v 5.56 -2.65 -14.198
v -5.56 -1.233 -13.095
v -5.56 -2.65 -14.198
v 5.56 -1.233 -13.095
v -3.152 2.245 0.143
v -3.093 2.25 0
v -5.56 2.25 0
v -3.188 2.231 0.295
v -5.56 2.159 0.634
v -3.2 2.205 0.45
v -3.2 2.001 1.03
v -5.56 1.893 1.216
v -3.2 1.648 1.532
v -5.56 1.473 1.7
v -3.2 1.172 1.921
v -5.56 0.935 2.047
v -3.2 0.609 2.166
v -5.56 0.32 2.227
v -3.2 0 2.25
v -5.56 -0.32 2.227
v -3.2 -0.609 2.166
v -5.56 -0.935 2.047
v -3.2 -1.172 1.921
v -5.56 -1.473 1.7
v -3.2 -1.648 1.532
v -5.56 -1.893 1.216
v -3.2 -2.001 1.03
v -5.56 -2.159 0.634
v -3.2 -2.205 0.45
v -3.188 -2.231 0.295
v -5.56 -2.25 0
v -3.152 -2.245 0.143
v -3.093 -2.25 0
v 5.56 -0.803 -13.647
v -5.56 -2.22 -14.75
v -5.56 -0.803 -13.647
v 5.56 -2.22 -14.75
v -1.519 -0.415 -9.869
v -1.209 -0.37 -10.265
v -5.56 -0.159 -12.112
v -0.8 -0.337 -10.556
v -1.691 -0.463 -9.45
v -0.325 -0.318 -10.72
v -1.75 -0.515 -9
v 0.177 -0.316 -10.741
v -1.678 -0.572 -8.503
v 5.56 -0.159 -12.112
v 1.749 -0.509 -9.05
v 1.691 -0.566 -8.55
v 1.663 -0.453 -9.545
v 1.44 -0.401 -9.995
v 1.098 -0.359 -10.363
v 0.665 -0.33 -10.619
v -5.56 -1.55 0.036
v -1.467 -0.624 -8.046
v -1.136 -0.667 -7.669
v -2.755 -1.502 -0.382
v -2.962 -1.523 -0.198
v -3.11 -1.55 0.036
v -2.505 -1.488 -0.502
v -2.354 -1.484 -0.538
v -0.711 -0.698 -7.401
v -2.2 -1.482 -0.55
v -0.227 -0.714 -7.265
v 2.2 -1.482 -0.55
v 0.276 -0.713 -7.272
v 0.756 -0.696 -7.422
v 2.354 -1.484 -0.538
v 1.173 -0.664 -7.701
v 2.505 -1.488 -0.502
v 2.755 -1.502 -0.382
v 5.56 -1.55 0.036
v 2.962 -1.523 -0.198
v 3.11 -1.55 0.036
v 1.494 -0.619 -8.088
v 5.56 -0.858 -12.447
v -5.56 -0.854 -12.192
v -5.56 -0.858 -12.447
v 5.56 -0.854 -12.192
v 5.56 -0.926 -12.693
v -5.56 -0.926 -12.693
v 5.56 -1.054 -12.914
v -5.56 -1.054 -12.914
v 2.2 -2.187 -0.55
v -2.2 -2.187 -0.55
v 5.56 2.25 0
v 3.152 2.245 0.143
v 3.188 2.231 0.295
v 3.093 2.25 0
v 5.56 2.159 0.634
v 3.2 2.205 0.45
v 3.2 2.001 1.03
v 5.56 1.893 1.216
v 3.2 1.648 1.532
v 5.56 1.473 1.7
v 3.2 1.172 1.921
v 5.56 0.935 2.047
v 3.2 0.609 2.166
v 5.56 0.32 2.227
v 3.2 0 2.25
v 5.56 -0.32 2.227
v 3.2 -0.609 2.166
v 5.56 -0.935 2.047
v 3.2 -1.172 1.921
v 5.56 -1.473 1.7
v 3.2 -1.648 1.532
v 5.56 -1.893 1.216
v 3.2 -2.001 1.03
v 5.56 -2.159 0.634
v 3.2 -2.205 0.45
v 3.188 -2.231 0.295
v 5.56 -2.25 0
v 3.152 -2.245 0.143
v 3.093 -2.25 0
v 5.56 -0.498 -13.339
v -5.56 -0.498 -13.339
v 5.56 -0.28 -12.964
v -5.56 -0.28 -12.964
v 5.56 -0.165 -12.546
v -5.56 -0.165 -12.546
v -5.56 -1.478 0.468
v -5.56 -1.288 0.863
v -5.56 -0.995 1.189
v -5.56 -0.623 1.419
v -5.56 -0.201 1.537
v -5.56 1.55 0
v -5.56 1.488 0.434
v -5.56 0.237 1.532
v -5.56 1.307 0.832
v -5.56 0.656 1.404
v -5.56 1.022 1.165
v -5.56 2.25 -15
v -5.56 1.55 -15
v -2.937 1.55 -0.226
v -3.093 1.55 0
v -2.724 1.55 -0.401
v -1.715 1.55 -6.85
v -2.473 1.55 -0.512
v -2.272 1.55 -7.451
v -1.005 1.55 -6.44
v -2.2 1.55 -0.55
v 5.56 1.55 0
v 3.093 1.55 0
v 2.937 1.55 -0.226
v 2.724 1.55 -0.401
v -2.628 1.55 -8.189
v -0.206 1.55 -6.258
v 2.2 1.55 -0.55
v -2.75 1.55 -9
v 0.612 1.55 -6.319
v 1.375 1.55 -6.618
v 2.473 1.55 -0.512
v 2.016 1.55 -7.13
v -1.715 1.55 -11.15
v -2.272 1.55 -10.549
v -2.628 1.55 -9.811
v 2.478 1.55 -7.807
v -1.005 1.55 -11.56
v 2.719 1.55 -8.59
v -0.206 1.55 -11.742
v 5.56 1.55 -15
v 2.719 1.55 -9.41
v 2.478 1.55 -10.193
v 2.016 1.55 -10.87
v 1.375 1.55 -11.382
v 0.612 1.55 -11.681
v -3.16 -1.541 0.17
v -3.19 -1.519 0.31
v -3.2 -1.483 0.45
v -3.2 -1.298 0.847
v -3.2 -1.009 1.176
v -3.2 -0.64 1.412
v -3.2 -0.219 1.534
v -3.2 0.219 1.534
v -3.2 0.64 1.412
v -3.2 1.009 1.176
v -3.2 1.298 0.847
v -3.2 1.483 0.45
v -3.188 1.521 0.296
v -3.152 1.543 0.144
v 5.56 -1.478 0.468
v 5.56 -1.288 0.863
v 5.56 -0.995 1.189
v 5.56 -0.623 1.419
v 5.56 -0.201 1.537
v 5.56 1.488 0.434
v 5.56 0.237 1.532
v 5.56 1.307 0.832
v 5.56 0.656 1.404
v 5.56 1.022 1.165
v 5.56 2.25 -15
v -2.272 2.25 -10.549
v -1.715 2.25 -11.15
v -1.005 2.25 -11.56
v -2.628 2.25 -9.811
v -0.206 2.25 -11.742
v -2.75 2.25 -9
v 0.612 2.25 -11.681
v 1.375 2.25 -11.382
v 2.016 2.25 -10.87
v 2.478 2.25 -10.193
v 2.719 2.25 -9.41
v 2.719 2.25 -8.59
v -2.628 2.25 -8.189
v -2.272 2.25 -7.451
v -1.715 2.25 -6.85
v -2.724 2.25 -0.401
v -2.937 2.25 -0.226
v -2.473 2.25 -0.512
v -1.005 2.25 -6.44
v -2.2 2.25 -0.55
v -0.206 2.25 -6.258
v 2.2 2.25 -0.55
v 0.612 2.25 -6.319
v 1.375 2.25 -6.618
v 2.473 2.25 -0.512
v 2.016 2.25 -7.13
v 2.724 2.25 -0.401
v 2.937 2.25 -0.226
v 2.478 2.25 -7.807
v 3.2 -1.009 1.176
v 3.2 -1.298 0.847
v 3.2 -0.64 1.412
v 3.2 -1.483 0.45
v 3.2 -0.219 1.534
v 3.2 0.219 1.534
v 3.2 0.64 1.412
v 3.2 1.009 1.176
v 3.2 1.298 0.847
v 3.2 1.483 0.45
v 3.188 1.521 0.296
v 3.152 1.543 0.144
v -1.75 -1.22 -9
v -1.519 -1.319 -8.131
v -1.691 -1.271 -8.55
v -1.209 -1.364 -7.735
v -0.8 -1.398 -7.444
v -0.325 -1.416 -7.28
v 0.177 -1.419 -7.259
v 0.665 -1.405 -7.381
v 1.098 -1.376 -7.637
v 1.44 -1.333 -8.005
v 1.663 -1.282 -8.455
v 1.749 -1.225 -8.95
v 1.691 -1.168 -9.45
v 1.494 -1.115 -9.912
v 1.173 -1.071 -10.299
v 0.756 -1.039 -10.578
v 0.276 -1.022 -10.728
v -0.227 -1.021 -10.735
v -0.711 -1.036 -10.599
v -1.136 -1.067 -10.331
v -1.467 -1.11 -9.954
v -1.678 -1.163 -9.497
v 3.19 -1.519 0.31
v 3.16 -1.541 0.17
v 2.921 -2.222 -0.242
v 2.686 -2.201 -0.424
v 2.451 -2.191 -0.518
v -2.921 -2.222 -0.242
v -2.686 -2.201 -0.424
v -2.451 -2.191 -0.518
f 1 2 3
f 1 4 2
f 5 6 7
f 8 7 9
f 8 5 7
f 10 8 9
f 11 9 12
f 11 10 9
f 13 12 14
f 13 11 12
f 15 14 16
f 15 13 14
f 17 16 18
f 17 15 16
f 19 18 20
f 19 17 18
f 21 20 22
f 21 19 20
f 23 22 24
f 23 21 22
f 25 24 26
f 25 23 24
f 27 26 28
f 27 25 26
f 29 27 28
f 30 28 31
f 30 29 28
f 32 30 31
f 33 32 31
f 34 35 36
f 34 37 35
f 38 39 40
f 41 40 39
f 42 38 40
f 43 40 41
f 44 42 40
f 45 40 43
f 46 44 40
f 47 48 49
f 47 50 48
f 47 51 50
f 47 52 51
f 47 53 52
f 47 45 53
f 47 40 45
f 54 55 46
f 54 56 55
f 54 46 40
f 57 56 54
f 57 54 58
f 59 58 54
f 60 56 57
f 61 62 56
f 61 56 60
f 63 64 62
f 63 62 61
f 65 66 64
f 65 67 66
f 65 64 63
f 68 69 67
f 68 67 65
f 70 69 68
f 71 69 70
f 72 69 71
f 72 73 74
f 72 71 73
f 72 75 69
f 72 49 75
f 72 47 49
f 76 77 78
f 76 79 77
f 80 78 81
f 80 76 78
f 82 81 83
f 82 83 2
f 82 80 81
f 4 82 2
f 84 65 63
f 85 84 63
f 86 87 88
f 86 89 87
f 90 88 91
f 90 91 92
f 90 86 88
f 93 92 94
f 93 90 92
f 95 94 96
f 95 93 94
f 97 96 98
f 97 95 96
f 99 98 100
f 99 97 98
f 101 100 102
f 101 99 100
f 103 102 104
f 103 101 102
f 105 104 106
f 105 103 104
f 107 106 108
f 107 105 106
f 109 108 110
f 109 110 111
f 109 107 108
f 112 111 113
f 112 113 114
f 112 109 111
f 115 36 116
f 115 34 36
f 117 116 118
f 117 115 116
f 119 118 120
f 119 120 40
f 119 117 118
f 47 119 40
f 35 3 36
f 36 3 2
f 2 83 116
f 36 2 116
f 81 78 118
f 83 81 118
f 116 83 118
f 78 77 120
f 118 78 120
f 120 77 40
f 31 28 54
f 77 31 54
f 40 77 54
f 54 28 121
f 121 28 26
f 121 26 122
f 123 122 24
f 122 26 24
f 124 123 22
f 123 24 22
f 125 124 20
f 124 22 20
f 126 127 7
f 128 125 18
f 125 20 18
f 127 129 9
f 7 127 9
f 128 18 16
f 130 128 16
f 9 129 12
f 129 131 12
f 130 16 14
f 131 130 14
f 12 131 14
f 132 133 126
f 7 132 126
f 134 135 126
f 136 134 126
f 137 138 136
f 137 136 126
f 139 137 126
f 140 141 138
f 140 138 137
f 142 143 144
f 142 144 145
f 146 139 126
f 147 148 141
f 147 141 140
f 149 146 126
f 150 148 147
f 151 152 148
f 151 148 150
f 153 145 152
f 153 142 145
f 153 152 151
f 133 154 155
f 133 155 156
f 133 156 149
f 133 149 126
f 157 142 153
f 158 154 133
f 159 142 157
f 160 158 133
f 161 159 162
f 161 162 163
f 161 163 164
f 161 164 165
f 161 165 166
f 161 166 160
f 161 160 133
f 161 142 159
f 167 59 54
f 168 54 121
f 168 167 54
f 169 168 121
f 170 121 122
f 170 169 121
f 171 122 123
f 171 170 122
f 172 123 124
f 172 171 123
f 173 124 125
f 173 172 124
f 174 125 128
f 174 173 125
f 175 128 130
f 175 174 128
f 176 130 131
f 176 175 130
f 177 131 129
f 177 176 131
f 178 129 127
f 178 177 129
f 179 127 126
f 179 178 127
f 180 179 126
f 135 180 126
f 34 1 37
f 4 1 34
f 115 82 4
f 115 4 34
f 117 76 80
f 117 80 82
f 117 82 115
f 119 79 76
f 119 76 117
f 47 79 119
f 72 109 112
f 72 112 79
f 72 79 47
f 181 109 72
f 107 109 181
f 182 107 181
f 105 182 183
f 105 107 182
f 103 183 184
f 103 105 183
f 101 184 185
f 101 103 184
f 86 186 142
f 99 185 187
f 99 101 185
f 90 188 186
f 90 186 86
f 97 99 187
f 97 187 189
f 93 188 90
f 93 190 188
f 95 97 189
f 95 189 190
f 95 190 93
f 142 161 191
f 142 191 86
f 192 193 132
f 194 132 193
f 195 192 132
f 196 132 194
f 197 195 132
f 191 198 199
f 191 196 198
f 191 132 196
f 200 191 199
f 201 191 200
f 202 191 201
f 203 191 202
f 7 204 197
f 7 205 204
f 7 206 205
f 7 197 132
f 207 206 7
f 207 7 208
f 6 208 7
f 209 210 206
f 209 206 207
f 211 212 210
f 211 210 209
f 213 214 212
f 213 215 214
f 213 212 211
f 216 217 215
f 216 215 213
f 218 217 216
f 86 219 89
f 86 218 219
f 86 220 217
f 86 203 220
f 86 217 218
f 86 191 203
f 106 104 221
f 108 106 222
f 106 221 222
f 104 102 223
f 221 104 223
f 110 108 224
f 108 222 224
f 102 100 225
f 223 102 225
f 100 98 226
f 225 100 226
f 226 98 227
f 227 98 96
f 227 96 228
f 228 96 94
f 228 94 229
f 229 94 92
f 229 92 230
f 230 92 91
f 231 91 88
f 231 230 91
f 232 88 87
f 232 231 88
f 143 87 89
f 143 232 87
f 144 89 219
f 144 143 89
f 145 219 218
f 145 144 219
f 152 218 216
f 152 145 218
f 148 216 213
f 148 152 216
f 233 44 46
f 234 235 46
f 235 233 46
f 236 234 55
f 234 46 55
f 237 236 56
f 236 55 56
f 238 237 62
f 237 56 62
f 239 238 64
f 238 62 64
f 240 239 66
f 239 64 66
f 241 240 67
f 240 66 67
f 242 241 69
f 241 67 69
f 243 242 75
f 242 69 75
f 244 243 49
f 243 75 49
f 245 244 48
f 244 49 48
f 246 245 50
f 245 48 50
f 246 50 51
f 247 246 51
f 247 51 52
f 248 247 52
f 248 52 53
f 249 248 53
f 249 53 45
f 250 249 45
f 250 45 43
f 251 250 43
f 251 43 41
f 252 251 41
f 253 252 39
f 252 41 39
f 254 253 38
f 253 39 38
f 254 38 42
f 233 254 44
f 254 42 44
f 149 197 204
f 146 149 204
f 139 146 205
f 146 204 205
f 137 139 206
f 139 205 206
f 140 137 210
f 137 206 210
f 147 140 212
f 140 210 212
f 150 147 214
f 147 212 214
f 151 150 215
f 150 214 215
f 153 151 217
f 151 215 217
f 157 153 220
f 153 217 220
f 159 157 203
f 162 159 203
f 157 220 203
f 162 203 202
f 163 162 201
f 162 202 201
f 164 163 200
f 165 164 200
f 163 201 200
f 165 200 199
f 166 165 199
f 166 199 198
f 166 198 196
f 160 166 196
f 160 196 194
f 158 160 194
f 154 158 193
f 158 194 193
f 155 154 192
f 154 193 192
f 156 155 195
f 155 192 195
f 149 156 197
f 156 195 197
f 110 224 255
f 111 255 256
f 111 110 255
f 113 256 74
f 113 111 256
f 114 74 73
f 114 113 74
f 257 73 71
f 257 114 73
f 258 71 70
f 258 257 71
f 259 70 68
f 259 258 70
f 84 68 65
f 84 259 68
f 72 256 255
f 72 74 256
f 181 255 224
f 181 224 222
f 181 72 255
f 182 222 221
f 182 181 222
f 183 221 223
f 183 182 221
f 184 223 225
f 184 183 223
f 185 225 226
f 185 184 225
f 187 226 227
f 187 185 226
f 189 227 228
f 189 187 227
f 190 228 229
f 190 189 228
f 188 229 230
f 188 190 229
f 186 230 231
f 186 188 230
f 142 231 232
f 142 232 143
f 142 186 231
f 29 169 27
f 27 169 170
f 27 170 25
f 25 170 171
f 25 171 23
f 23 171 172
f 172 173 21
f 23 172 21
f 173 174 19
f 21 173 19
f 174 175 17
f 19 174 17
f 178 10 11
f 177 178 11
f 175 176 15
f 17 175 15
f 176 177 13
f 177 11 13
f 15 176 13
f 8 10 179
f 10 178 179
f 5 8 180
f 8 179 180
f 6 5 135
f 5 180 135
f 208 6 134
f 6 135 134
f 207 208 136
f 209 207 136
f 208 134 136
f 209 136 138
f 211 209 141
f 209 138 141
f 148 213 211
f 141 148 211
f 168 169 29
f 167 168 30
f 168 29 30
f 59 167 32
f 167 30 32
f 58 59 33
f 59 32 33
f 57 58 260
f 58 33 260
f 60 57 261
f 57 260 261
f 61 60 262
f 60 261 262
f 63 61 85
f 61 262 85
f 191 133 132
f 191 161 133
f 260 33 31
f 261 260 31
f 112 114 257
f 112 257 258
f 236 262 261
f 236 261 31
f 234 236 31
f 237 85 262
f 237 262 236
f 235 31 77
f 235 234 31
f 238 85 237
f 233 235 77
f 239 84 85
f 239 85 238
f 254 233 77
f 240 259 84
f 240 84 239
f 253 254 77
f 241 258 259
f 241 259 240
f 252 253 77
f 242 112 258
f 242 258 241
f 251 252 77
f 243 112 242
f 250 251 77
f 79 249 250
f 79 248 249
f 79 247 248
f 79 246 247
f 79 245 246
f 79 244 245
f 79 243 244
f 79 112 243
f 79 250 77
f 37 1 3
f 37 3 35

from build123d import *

# Parameters (mm, degrees)
F1_DEPTH = 5.56
F2_W     = 6.4
F2_H     = 3.95
F2_H_2   = 0.55
F2_R     = 1.75
F3_DEPTH = 4.901
F2_R_2   = 2.75
F4_DEPTH = 0.7
F5_R     = 1
F6_R     = 1.7


with BuildPart() as f1:
    # F0 (on Right) → F1 (new body, symmetric)
    with BuildSketch(Plane.YZ):
        with BuildLine():
            Line((1.55, -15), (2.25, -15))
            Line((2.25, -15), (2.25, 0))
            ThreePointArc((2.25, 0), (0, 2.25), (-2.25, 0))
            Line((-2.25, 0), (-0.790171, -12.749847))
            Line((-0.790171, -12.749847), (-2.65, -14.197634))
            Line((-2.65, -14.197634), (-2.22001, -14.75))
            Line((-2.22001, -14.75), (-0.05, -13.060752))
            Line((-0.05, -13.060752), (-1.549576, 0.036243))
            ThreePointArc((-1.549576, 0.036243), (0.018123, 1.549894), (1.55, 0))
            Line((1.55, 0), (1.55, -15))
        make_face()
    extrude(amount=F1_DEPTH, both=True)

    # F2 (on face) → F3 (cut, through all)
    with BuildSketch(Plane(origin=(0, 2.25, 0), x_dir=(-1, 0, 0), z_dir=(0, 1, 0))):
        with Locations((0, 1.975)):
            Rectangle(F2_W, F2_H)
        with Locations((0, -0.275)):
            Rectangle(F2_W, F2_H_2)
        with Locations((0, -9)):
            Circle(F2_R)
    extrude(amount=-F3_DEPTH, mode=Mode.SUBTRACT)

    # F2 (on face) → F4 (cut, through all)
    with BuildSketch(Plane(origin=(0, 2.25, 0), x_dir=(-1, 0, 0), z_dir=(0, 1, 0))):
        with Locations((0, -9)):
            Circle(F2_R_2)
        with Locations((0, -9)):
            Circle(F2_R, mode=Mode.SUBTRACT)
    extrude(amount=-F4_DEPTH, mode=Mode.SUBTRACT)

    # F5
    f5_edges = [f1.edges().sort_by_distance(p)[0] for p in [
        (-3.2, -1.83474, -0.55),
        (-3.2, 1.9, -0.55),
        (3.2, 1.9, -0.55),
        (3.2, -1.83474, -0.55),
        (0, -0.790171, -12.749847),
    ]]
    fillet(f5_edges, radius=F5_R)

    # F6
    f6_edges = [f1.edges().sort_by_distance(p)[0] for p in [
        (0, -0.05, -13.060752),
    ]]
    fillet(f6_edges, radius=F6_R)


solid = f1.part
